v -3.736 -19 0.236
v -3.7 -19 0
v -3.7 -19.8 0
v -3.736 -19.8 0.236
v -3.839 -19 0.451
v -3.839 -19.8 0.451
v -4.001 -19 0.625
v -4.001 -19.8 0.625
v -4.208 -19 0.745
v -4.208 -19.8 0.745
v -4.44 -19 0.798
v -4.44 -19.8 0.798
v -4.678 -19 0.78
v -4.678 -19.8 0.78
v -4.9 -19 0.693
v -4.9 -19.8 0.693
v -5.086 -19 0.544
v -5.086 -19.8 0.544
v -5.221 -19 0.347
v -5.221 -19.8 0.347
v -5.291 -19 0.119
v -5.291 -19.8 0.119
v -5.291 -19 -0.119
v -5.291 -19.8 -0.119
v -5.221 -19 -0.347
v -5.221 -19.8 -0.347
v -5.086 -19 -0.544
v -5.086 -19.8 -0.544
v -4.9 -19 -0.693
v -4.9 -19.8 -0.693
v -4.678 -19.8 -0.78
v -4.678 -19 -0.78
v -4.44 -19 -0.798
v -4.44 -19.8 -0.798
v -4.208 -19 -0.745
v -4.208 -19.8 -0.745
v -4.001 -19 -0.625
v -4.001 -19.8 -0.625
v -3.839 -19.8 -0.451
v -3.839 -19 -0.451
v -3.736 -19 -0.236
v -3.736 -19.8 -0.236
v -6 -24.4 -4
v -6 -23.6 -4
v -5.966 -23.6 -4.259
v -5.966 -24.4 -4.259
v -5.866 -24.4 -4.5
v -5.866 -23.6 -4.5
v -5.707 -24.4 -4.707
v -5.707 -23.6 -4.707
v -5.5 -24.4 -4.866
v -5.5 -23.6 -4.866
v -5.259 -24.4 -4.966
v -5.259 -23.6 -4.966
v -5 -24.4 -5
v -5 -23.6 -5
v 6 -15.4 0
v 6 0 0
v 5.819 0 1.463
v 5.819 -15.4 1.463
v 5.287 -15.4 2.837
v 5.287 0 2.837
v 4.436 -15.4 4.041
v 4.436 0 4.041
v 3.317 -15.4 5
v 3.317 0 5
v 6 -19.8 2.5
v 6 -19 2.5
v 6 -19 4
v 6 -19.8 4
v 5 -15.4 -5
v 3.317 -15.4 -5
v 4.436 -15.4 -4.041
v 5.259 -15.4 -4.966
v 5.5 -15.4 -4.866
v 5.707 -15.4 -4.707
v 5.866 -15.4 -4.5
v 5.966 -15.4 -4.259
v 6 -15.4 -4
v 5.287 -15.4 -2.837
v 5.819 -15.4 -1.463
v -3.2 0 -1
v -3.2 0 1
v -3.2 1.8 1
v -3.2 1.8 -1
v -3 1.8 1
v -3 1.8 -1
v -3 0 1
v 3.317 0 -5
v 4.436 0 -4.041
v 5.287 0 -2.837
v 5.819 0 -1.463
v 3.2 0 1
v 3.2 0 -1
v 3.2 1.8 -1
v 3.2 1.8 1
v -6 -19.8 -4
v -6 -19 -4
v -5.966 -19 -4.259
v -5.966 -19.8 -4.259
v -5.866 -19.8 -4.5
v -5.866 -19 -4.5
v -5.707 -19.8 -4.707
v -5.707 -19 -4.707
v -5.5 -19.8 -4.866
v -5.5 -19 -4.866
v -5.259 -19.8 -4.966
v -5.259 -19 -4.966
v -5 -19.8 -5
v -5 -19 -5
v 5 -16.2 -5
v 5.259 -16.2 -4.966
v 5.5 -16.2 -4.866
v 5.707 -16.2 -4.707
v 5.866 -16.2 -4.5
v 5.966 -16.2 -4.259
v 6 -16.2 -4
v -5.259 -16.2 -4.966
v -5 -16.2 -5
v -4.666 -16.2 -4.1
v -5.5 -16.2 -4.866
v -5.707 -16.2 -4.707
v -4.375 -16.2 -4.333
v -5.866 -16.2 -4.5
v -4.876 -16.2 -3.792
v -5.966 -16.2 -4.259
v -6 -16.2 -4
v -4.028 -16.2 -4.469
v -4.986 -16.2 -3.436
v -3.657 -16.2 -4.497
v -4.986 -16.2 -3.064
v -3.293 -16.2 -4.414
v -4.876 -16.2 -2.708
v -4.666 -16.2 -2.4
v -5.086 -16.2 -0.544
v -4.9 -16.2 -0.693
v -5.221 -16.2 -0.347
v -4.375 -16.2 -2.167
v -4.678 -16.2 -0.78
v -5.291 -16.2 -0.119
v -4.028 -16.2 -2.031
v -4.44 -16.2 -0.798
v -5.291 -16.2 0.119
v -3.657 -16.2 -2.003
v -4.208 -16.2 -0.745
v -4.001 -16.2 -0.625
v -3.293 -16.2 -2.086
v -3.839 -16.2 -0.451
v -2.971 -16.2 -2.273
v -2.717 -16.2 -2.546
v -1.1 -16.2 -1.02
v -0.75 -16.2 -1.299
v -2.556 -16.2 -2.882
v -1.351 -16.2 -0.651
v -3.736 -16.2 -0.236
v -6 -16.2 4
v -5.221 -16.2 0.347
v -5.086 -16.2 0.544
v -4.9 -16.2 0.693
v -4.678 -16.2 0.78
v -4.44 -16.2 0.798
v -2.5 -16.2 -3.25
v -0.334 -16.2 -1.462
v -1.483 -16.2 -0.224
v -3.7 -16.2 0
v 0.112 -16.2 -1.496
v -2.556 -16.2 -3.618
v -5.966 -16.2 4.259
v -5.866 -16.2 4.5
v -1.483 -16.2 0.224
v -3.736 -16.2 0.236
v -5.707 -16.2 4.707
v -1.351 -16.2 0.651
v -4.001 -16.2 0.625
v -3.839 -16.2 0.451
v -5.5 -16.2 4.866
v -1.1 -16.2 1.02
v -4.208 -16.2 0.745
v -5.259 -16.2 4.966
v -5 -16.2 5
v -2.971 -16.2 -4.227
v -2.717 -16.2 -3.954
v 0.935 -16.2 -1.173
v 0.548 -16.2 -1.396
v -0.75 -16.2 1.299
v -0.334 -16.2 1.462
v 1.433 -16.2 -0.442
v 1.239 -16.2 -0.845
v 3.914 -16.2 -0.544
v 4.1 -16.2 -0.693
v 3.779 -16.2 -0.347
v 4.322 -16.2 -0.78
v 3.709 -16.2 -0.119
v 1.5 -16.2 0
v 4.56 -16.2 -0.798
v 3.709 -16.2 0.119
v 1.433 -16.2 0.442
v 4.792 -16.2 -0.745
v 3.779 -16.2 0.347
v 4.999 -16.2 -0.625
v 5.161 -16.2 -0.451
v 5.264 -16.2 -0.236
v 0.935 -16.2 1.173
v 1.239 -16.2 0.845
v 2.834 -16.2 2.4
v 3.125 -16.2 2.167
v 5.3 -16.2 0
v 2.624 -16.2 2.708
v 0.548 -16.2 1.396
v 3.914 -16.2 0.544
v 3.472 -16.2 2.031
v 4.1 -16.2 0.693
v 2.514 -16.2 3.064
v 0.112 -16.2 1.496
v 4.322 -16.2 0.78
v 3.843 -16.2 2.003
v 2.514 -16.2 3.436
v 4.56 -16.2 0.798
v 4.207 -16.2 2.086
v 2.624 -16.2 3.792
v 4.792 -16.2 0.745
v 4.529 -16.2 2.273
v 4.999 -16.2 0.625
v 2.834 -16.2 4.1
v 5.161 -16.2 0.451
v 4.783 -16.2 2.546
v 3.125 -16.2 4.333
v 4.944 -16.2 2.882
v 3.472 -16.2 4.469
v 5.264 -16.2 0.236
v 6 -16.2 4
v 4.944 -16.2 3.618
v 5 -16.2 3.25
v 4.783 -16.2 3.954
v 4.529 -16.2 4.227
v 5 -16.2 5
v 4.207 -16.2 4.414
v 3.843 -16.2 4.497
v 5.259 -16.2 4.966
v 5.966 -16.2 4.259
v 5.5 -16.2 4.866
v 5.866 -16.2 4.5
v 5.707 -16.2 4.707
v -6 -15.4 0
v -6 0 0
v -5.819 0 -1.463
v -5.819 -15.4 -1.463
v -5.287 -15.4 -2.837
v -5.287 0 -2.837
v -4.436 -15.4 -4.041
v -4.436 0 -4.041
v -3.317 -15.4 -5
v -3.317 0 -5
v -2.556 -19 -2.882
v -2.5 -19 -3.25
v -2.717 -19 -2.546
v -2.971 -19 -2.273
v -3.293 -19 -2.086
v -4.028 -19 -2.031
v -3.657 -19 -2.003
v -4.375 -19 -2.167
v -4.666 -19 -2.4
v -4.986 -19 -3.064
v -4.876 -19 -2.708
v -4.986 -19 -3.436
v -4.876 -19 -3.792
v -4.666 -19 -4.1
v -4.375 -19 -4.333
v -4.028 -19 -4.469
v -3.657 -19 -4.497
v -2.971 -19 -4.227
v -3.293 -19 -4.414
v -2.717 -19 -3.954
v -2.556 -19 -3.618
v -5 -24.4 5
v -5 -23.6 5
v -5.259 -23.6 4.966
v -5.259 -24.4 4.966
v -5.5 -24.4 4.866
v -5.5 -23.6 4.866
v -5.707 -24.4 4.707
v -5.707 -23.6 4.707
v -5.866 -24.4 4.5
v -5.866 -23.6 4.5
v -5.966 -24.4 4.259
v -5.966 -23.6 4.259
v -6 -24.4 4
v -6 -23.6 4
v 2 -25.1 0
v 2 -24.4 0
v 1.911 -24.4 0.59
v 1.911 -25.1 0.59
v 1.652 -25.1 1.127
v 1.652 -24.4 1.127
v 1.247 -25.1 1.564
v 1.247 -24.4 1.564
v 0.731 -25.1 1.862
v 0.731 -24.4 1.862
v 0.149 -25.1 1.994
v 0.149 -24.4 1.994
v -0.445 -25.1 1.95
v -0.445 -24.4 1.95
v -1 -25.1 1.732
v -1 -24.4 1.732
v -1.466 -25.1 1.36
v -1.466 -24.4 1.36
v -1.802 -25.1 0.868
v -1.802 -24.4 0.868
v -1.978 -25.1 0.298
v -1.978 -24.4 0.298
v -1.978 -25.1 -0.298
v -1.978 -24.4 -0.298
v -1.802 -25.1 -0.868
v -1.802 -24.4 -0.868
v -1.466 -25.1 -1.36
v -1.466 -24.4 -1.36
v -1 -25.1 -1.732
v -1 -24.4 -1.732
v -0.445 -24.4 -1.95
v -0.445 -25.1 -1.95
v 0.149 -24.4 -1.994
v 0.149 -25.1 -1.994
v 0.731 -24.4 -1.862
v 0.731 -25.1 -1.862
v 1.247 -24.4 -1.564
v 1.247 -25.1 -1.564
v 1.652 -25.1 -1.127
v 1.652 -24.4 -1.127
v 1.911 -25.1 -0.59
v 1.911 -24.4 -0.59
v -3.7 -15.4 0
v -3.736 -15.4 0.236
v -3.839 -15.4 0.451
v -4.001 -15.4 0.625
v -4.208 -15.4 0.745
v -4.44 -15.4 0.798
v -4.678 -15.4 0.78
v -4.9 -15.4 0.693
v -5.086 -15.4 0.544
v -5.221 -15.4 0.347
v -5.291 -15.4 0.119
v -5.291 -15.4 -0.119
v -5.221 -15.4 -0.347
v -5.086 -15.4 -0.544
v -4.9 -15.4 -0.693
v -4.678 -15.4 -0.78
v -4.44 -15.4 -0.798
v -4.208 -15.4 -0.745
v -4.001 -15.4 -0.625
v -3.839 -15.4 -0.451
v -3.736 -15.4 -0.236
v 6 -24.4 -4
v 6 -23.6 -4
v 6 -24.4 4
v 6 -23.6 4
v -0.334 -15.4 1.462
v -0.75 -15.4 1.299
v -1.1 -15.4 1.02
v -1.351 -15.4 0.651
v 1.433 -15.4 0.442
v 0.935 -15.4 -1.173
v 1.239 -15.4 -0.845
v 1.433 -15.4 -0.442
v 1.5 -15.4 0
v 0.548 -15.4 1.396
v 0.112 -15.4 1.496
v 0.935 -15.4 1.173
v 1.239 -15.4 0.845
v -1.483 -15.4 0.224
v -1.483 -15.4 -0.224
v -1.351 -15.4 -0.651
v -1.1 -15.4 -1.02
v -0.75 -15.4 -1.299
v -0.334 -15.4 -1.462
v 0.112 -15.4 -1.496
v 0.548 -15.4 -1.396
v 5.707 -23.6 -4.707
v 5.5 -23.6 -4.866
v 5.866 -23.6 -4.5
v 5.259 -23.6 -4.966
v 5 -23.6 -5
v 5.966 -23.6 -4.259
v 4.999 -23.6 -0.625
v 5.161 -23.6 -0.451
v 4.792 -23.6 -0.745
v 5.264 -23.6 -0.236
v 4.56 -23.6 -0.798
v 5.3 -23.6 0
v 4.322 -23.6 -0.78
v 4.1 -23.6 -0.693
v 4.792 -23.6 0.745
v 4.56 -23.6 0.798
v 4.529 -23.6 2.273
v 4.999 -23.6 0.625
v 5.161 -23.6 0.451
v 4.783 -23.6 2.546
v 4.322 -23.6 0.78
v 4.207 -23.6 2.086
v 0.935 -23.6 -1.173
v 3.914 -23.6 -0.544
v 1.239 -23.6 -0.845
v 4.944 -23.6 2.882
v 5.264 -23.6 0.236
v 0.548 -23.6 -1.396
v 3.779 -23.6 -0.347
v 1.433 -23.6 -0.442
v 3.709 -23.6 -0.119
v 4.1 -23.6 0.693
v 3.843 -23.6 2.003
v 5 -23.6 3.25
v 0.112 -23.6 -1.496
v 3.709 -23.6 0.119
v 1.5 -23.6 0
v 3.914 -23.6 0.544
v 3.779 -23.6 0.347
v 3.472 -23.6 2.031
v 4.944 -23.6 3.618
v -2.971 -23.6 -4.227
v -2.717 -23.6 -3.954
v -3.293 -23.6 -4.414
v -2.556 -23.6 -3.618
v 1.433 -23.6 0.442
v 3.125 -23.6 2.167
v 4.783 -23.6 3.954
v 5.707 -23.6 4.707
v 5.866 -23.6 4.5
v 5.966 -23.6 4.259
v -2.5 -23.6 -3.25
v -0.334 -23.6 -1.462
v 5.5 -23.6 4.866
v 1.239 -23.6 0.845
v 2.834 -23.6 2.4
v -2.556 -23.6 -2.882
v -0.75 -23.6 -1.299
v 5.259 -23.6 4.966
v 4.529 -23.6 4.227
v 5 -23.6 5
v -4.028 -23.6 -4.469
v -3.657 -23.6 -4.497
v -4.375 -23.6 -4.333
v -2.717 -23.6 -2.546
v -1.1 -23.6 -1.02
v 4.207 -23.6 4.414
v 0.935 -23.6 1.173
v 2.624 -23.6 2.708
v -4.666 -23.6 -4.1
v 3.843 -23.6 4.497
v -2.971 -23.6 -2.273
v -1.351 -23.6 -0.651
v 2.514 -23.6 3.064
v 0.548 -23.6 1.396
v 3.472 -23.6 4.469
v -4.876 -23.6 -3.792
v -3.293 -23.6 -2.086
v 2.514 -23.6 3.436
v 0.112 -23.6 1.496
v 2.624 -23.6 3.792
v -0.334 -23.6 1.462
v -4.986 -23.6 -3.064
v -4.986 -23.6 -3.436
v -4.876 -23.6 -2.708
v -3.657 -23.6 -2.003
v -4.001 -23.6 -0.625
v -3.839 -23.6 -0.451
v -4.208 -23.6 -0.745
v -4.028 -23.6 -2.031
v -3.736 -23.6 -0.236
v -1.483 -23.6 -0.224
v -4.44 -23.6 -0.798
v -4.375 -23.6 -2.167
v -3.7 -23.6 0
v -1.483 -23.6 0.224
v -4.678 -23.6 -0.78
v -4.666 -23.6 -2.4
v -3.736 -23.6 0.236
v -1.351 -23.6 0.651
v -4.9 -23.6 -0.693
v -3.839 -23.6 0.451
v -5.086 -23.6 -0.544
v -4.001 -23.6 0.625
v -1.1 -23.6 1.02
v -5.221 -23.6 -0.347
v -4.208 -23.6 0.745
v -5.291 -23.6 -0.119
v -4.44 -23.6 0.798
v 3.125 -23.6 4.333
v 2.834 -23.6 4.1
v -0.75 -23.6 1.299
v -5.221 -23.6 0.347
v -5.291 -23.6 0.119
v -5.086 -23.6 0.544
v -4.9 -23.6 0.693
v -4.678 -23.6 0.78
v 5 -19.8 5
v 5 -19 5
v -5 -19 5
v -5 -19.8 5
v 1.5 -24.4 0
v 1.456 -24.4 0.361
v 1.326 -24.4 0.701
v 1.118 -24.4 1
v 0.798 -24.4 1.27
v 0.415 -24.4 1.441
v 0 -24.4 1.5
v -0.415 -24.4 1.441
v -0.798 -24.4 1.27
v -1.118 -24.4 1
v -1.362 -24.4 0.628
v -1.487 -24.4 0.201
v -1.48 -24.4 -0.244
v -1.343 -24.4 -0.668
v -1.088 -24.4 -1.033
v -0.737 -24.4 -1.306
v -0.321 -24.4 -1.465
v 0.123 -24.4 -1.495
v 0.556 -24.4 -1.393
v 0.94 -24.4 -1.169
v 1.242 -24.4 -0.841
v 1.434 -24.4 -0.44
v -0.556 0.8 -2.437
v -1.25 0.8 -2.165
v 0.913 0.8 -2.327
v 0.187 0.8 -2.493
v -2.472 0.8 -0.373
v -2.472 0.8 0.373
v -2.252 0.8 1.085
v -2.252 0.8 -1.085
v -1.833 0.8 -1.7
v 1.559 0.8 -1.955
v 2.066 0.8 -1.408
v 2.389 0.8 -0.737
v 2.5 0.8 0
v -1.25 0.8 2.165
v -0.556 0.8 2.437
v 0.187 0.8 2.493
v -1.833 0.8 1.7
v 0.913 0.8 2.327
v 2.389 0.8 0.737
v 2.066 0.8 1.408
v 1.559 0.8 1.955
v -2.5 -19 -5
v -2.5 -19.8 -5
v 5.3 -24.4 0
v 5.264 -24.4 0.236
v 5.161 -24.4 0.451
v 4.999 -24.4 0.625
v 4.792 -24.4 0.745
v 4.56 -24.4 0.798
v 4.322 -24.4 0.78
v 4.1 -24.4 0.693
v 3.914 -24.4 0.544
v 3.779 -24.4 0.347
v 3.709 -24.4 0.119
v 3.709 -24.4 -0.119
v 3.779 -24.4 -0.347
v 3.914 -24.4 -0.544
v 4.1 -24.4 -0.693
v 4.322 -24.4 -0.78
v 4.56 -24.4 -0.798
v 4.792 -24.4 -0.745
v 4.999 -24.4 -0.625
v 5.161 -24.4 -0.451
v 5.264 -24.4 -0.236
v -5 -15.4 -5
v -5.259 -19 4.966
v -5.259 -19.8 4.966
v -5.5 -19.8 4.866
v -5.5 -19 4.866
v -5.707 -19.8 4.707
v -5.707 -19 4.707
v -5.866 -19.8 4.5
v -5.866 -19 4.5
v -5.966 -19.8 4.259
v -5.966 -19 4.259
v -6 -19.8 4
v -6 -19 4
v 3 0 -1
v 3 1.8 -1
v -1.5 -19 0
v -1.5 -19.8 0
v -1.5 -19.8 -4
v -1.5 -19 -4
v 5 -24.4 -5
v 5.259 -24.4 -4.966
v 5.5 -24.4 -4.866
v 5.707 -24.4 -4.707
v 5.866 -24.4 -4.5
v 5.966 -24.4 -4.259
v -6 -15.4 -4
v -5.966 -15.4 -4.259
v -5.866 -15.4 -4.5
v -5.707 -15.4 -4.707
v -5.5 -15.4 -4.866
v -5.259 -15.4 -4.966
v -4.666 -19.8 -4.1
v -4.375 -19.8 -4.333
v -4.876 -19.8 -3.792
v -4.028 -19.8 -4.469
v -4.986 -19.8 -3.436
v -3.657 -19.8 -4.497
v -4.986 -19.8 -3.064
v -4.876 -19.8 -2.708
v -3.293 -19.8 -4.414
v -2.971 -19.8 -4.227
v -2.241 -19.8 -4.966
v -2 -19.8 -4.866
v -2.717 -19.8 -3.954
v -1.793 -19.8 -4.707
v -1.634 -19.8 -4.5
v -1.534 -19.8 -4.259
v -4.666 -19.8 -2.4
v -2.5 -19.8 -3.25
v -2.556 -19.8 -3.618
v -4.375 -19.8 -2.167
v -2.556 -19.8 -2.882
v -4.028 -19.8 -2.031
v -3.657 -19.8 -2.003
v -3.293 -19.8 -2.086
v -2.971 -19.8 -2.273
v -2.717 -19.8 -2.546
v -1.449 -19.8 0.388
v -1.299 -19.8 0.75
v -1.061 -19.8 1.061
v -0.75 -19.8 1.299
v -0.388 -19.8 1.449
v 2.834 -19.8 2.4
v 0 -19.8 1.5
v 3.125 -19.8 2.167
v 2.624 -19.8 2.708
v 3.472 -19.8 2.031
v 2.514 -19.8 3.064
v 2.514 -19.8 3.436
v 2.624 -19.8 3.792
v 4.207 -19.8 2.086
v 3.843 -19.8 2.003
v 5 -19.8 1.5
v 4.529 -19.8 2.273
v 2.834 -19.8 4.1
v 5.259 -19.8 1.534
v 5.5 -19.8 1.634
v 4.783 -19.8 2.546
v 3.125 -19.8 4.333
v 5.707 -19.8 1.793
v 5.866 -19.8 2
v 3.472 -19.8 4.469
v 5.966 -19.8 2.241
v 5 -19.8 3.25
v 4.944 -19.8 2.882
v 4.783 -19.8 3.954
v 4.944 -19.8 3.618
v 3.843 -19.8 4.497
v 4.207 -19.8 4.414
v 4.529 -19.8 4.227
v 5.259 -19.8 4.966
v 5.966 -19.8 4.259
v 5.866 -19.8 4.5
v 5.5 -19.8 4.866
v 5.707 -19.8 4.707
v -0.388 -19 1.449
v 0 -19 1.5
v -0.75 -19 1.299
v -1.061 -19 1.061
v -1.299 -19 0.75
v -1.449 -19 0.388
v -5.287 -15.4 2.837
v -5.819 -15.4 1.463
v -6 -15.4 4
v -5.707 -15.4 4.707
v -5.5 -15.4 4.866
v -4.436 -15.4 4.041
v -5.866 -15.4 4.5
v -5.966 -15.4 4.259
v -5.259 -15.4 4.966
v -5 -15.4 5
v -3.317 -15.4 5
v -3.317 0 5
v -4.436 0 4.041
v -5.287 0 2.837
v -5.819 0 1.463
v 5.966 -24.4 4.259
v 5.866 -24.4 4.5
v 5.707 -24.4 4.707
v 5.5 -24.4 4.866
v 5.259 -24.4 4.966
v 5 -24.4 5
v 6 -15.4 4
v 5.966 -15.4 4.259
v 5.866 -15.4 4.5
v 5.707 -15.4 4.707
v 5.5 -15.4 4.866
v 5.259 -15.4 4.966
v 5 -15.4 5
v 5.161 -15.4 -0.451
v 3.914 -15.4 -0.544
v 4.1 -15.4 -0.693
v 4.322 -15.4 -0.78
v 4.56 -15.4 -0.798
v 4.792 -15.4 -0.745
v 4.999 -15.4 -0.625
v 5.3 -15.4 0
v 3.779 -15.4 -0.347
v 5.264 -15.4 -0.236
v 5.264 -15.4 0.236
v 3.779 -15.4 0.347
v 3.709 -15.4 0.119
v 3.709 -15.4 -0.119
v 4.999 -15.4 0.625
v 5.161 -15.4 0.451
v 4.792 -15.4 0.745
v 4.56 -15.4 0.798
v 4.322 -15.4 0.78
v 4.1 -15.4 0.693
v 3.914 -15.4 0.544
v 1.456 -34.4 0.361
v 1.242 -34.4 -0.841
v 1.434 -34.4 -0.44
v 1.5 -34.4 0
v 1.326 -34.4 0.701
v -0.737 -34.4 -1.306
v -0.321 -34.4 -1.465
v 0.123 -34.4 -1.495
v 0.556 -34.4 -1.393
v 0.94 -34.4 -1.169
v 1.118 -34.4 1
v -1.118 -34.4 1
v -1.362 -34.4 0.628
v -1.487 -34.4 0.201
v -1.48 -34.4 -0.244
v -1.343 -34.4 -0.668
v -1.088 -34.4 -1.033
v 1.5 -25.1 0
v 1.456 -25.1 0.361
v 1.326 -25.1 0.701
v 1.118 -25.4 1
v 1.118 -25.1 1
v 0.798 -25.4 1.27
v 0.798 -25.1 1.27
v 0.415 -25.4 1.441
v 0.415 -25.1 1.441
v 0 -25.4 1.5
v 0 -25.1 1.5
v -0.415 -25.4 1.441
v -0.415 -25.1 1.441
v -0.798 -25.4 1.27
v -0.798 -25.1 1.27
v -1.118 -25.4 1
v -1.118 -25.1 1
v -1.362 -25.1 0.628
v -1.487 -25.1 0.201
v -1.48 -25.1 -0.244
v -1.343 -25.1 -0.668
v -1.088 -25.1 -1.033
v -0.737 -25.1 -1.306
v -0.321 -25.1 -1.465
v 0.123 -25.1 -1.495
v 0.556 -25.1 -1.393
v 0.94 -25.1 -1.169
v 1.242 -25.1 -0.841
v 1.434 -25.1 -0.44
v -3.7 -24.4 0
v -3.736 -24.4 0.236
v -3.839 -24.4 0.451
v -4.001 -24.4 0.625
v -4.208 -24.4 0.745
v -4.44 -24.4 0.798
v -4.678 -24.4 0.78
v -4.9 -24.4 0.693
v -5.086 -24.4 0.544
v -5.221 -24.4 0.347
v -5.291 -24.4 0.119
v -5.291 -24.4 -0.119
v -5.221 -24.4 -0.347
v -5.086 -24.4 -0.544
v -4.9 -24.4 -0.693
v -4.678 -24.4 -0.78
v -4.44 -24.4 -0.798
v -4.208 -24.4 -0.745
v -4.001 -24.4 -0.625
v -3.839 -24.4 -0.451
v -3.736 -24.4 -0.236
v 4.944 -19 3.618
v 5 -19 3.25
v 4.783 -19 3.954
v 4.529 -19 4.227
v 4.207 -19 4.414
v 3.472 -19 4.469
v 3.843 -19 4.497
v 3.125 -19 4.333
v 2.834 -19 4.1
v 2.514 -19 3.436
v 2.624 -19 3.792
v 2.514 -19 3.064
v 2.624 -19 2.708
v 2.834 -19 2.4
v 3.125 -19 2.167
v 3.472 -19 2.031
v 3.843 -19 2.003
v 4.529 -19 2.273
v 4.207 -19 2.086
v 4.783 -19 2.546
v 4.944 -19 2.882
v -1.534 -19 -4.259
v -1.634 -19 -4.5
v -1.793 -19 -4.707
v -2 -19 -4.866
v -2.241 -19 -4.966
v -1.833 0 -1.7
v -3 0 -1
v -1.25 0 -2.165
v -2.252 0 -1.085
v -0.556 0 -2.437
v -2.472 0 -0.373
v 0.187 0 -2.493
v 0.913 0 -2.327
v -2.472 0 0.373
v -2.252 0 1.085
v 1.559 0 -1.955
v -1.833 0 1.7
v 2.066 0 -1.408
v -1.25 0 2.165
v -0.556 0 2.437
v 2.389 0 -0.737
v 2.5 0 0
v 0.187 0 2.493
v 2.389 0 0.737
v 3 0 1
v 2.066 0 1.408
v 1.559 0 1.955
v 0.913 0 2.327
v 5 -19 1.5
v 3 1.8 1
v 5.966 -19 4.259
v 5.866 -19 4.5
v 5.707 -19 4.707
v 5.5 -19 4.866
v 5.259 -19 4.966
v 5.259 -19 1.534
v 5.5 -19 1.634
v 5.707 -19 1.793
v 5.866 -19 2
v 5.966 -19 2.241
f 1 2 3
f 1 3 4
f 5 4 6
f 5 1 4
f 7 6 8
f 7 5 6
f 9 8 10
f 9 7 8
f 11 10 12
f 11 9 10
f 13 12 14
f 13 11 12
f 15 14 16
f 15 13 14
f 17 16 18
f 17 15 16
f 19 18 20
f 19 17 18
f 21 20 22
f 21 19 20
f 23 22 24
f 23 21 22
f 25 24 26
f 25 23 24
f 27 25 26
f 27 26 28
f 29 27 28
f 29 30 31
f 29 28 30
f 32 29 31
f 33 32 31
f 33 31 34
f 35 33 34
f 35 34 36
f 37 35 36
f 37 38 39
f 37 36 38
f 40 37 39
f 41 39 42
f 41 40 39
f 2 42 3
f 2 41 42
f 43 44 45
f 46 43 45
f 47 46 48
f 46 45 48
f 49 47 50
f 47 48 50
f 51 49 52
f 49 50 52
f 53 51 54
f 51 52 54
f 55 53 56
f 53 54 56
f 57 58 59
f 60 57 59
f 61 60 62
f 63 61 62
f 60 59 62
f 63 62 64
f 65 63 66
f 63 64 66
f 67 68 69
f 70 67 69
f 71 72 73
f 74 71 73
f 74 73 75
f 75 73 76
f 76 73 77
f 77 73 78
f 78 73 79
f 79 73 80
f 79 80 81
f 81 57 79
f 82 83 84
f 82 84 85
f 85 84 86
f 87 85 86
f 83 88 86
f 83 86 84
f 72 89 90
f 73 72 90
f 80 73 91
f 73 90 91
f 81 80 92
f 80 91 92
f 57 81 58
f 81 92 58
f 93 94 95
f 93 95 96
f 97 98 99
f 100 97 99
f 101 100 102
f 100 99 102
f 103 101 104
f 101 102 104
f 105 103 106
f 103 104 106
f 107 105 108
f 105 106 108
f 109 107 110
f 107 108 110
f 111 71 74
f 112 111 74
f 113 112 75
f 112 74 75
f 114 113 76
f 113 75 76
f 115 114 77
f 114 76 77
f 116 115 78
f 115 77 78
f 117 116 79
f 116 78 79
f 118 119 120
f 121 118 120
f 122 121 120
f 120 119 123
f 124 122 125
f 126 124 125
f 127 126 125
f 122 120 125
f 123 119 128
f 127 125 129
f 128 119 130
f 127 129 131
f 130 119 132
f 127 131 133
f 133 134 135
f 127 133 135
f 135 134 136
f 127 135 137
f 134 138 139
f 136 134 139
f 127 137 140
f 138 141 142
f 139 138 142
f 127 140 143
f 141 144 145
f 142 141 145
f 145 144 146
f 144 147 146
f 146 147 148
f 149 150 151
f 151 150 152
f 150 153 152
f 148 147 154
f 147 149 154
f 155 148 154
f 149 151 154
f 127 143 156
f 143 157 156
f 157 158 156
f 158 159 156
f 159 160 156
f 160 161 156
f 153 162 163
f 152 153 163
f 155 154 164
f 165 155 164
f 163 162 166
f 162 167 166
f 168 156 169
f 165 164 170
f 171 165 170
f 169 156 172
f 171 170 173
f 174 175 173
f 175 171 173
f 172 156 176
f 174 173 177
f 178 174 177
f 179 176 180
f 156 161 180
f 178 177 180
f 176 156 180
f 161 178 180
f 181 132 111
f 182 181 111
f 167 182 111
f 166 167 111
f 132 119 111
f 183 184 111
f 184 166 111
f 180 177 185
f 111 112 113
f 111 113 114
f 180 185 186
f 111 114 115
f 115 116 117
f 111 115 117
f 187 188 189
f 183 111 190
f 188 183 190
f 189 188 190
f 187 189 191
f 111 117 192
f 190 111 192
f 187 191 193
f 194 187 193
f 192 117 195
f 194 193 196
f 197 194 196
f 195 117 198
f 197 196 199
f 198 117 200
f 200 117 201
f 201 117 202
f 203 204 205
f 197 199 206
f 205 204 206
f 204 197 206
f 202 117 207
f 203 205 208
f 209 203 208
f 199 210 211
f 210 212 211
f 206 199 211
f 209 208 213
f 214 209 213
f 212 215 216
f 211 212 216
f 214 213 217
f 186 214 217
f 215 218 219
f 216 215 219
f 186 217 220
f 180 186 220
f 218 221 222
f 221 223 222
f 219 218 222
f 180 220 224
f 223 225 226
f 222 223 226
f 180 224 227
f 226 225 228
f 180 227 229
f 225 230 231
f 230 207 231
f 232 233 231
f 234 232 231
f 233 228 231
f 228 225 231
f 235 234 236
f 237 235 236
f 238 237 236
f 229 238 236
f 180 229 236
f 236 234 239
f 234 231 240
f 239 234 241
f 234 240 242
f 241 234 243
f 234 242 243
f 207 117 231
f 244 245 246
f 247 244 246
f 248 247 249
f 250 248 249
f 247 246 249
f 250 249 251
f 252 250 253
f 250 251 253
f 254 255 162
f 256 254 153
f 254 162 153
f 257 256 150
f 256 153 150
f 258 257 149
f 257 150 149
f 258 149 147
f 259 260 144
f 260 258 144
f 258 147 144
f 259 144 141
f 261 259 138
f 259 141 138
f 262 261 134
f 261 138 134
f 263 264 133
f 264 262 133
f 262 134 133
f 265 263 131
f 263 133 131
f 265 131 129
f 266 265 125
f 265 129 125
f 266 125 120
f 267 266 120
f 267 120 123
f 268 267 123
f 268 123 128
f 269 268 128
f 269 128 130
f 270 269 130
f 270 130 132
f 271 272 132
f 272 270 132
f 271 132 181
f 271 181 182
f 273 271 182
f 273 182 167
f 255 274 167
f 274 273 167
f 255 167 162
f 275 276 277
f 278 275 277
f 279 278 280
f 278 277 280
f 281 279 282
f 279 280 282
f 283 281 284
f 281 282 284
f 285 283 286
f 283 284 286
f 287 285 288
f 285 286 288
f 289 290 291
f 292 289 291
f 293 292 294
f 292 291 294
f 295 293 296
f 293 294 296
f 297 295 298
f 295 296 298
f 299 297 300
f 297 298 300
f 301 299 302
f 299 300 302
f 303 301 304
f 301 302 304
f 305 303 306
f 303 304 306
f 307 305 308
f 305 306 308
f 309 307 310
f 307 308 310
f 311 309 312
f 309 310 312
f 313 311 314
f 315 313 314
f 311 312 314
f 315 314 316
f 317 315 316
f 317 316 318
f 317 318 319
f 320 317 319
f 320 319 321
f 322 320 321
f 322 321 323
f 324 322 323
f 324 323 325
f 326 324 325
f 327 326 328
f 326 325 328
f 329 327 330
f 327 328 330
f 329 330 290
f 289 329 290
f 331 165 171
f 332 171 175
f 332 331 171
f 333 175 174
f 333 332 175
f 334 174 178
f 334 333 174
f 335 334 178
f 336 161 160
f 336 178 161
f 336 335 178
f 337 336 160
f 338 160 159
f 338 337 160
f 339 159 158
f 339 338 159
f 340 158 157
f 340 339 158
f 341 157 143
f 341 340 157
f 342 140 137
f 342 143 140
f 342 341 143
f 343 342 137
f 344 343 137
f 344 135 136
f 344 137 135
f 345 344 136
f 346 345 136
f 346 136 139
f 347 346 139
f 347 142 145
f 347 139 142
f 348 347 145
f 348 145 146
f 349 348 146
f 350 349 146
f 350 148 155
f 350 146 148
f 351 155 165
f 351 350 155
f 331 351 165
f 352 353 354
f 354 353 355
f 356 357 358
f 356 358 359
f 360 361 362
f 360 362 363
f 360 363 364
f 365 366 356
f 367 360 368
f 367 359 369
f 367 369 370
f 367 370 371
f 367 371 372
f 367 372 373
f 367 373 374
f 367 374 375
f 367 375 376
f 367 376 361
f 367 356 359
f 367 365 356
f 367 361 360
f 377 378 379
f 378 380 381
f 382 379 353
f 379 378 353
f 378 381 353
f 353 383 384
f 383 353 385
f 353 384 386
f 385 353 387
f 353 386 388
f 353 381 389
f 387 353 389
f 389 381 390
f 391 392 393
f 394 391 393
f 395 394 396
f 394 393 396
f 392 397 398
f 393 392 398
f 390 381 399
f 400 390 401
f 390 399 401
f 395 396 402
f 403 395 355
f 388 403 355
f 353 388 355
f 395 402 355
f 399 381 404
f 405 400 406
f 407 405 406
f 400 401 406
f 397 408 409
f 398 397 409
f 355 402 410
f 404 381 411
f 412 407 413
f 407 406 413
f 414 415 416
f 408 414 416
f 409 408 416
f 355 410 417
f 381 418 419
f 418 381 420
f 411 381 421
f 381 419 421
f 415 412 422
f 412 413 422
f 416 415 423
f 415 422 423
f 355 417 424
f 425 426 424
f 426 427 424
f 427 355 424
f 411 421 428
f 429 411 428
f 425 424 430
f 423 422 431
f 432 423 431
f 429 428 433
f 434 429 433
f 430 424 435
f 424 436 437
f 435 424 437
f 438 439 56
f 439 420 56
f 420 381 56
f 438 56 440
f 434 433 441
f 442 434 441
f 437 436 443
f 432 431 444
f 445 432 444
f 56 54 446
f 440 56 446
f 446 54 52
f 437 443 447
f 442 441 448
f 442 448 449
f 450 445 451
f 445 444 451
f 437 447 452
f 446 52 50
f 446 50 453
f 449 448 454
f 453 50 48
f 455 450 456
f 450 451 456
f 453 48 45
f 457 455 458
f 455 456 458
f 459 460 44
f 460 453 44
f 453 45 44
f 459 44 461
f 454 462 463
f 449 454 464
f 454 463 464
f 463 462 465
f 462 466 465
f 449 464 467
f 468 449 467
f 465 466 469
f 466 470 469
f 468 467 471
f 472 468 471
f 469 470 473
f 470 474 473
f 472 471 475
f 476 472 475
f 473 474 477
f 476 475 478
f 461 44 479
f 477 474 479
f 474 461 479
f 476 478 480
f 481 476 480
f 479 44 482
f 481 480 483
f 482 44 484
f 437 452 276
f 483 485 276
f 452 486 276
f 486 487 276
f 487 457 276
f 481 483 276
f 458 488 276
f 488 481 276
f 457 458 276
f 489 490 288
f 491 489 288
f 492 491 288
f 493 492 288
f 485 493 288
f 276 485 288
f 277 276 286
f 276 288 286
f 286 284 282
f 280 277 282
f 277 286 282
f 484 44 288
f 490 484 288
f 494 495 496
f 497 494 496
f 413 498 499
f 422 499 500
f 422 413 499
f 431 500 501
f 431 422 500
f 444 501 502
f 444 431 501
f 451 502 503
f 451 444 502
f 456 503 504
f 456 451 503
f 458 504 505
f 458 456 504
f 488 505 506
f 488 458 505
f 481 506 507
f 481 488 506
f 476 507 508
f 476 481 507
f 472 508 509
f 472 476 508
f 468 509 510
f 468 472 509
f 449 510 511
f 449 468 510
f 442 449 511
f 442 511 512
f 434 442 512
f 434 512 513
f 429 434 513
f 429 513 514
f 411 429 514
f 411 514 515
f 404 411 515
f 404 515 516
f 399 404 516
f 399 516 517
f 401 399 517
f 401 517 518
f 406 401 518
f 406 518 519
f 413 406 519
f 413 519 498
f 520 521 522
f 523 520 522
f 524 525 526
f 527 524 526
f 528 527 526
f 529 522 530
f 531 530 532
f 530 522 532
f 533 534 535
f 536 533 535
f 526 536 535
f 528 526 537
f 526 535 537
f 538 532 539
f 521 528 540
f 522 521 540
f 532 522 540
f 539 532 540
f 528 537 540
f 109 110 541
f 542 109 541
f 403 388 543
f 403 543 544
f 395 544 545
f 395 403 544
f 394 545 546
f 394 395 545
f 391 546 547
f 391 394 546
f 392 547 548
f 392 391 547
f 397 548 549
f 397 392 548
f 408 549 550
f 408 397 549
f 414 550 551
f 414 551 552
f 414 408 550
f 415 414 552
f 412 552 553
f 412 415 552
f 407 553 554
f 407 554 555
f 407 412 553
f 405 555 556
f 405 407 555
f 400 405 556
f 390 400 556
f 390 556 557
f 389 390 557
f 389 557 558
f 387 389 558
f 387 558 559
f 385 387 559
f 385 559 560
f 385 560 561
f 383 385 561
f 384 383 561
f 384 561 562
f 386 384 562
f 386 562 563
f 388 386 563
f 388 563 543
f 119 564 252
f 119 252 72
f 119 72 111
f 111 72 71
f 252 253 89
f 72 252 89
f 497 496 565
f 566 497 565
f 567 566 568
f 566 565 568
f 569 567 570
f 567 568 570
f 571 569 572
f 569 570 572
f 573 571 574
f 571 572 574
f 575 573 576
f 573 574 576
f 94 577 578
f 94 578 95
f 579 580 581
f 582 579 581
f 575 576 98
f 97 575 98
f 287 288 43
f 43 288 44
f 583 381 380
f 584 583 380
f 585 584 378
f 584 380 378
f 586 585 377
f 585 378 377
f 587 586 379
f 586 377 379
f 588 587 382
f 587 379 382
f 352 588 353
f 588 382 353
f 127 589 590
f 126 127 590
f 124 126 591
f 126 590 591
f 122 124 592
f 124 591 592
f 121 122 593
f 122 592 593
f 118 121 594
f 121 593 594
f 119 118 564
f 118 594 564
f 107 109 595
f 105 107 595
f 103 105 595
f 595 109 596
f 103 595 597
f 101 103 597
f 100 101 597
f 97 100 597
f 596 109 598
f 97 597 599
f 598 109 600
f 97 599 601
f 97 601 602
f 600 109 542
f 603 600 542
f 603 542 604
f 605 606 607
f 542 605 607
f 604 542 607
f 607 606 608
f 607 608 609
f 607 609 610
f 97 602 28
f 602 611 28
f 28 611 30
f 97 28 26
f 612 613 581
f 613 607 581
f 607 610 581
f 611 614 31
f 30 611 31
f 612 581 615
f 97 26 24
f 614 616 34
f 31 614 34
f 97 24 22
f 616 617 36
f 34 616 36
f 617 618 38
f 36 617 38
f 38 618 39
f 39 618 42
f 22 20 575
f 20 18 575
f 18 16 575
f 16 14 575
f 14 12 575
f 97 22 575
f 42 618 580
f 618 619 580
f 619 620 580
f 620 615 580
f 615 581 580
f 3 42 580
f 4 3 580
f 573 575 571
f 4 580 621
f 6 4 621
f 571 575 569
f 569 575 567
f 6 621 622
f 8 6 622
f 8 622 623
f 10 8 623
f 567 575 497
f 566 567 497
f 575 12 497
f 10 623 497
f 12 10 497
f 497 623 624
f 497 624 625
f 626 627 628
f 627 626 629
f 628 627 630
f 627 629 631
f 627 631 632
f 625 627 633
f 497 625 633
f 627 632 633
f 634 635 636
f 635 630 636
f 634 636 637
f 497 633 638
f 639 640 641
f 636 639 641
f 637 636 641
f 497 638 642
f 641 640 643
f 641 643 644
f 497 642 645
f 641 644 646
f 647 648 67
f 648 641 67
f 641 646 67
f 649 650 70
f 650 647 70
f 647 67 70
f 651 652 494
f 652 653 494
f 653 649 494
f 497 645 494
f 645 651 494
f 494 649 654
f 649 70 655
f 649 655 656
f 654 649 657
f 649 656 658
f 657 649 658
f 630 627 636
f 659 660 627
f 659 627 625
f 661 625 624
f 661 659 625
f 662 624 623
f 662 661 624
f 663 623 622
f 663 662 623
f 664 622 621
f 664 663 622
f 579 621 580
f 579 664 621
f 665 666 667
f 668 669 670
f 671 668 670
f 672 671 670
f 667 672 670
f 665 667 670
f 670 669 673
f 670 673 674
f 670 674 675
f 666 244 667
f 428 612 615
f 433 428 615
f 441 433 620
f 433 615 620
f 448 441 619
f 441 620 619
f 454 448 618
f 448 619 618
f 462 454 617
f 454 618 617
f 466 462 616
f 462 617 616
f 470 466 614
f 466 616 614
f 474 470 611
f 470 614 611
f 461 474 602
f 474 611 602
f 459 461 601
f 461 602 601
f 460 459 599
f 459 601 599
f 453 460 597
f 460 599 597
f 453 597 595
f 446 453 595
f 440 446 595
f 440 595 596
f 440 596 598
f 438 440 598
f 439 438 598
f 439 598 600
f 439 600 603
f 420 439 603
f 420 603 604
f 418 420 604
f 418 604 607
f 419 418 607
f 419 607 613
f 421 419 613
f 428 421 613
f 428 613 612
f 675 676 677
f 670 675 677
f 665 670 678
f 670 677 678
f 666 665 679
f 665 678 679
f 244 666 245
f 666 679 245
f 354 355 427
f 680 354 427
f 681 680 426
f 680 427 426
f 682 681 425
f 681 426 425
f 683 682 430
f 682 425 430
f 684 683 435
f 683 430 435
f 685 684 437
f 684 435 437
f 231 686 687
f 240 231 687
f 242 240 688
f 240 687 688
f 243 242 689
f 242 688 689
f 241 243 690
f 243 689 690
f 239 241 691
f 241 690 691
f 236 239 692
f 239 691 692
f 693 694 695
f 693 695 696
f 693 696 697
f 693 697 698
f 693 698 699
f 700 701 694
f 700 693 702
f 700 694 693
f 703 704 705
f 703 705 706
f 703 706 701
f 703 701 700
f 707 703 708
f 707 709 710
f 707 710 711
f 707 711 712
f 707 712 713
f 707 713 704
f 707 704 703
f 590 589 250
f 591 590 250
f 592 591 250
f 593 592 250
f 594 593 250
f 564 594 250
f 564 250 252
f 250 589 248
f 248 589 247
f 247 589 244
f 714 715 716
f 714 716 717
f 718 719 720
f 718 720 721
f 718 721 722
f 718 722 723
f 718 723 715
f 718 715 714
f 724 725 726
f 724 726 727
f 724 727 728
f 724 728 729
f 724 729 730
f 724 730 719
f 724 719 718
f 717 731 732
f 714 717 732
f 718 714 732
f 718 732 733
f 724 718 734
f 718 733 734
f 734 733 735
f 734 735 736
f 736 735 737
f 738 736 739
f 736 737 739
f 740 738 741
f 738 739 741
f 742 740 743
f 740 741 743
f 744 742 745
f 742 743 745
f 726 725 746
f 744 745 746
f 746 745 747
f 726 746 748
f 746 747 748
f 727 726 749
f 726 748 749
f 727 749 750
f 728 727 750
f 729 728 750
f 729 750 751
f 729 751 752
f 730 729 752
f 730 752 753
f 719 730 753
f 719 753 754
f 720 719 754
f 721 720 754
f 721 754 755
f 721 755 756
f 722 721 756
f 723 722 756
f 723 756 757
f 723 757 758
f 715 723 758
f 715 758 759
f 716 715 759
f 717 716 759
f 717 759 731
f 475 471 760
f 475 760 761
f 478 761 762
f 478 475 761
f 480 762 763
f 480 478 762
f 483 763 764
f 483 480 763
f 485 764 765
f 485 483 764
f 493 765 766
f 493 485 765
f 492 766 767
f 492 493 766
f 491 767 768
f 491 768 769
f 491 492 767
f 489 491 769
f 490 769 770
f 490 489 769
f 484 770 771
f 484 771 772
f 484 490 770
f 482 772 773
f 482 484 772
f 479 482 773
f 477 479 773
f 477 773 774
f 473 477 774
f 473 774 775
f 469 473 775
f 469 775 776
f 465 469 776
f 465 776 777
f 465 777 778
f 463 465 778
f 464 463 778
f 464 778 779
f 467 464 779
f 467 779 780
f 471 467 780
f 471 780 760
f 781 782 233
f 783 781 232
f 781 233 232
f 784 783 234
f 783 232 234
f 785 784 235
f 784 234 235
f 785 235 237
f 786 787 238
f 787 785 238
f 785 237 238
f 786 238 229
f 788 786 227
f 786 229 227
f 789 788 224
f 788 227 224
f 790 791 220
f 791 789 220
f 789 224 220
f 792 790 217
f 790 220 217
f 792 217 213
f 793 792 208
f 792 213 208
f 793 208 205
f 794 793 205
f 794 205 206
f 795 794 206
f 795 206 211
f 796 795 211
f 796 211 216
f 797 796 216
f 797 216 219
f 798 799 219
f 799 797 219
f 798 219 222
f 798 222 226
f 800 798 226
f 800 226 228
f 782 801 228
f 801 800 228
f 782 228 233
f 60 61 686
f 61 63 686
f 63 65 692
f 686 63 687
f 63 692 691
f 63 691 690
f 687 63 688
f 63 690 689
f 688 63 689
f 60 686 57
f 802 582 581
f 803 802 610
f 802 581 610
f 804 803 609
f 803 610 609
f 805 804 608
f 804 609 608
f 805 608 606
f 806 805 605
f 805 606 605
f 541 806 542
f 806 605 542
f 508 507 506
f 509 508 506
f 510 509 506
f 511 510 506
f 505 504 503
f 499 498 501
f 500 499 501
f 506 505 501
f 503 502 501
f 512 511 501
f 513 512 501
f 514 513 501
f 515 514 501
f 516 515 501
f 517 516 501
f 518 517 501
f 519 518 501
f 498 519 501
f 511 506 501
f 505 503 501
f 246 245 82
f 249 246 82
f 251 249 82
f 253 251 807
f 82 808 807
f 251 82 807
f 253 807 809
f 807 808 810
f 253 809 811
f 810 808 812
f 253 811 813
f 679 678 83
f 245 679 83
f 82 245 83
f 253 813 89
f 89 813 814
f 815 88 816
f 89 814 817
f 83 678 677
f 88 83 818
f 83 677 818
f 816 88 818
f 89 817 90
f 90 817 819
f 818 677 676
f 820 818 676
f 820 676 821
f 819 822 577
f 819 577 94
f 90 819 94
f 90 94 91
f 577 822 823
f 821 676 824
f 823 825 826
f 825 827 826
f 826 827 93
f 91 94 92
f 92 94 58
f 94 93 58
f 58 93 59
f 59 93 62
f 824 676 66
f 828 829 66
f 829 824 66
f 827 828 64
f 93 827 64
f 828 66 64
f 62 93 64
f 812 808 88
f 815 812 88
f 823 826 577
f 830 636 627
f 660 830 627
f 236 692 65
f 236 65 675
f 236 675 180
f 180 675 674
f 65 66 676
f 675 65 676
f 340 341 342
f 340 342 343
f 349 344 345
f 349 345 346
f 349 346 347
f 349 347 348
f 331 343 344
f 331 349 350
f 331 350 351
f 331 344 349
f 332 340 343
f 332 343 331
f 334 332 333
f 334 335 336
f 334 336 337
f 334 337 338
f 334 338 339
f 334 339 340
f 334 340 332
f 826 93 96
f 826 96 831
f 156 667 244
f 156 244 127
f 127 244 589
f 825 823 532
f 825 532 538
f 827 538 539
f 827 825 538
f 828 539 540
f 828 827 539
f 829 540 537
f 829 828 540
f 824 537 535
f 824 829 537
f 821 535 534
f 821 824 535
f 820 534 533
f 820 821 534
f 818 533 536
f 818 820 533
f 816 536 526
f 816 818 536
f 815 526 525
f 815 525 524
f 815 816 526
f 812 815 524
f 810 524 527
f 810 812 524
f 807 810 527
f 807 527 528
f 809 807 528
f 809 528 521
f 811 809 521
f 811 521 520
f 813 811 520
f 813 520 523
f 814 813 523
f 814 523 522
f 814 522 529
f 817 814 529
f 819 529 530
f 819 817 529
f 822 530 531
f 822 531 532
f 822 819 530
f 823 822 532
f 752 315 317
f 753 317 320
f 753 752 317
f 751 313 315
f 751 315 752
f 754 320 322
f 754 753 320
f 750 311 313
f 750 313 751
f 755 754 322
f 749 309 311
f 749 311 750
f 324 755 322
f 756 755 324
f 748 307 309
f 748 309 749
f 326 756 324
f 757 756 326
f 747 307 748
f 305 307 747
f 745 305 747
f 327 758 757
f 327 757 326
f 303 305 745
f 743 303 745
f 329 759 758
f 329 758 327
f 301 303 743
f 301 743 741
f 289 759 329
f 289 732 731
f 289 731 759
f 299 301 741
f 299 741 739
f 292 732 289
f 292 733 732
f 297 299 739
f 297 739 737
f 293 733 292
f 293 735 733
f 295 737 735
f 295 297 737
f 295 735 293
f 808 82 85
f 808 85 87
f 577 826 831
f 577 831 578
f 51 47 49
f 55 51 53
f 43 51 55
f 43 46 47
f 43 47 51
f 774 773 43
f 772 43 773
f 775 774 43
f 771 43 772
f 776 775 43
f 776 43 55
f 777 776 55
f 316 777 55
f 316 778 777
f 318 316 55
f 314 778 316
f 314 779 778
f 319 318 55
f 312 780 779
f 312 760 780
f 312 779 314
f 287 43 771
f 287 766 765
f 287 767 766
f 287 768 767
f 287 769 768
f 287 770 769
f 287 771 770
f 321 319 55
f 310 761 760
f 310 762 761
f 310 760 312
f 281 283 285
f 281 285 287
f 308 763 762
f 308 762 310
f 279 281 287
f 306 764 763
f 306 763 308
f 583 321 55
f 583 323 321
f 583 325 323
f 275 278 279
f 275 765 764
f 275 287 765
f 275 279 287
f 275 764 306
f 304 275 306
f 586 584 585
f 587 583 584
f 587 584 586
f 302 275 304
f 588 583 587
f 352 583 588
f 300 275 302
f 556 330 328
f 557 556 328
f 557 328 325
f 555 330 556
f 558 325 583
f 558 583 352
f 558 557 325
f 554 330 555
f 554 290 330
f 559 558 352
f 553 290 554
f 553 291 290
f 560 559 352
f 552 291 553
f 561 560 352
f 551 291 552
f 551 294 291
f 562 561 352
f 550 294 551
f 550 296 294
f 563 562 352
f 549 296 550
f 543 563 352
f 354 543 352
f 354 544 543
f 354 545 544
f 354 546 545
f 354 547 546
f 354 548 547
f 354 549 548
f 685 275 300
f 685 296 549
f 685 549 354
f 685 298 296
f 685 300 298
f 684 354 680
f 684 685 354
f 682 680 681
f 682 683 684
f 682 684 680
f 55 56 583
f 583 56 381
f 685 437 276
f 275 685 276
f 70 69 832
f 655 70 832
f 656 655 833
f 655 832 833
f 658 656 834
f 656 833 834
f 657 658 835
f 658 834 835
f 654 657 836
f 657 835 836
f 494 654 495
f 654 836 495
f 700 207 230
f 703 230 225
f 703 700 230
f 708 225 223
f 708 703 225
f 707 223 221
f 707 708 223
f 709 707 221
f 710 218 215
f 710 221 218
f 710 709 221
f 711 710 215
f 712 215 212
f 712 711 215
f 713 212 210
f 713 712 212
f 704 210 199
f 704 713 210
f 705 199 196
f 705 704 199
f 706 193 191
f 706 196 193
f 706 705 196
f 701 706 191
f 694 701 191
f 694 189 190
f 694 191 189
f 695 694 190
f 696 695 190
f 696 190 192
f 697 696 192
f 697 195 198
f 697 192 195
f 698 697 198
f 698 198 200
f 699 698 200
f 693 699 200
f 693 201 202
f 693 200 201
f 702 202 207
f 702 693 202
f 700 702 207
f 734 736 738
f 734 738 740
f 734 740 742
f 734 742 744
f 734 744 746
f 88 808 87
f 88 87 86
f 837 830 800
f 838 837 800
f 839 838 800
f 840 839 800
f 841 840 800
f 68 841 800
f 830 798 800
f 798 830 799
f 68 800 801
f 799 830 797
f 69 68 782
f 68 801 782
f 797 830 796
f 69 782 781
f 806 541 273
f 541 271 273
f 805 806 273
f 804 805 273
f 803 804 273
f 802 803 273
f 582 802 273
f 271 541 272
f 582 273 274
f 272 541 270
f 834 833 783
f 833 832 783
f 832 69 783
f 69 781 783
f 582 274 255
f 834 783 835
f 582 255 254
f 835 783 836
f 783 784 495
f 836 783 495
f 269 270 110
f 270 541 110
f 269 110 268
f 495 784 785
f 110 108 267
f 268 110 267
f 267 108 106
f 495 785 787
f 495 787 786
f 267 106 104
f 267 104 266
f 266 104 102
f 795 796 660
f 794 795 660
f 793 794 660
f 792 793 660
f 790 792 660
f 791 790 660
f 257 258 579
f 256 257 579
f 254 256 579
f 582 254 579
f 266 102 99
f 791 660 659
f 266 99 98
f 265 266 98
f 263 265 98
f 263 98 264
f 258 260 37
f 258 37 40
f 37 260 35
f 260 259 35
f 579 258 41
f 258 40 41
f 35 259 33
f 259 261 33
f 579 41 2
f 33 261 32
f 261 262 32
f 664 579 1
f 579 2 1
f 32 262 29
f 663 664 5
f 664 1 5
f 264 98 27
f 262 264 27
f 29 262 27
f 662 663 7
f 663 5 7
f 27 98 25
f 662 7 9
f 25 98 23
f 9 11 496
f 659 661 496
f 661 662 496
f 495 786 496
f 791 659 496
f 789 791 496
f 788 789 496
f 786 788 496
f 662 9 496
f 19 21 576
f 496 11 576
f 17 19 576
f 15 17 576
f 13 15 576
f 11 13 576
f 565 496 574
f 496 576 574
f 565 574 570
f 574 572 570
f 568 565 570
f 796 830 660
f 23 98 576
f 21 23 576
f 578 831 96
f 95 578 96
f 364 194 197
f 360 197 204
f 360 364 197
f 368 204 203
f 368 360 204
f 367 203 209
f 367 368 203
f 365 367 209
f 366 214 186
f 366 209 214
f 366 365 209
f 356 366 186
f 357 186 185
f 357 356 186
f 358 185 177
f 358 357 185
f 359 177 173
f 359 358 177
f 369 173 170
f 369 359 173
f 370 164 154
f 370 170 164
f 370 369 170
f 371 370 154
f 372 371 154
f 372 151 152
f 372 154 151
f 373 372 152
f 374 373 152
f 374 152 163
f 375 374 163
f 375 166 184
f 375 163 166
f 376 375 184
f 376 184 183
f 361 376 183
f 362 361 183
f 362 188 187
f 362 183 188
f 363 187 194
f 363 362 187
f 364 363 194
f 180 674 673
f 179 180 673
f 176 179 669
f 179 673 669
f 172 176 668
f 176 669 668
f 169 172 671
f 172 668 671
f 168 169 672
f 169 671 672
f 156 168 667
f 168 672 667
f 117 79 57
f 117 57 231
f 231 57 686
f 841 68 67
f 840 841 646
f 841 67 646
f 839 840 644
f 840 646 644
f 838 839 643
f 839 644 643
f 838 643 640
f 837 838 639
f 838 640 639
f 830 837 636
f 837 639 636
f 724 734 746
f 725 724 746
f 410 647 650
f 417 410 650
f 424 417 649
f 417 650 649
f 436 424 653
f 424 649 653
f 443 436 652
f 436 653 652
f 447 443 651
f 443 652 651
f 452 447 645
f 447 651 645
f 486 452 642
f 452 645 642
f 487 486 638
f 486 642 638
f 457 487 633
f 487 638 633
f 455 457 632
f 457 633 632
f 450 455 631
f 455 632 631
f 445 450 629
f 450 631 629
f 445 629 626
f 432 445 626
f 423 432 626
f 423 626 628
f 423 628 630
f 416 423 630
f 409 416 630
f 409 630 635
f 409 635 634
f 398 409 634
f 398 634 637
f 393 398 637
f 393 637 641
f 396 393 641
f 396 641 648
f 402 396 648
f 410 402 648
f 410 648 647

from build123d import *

# Parameters (mm, degrees)
F1_DEPTH      = 15.4
F3_DEPTH      = 0.8
F4_DEPTH      = 1.8
F5_R          = 0.8
F5_R_2        = 1.5
F6_DEPTH      = 9
F7_W          = 3.8
F7_H          = 10
F7_W_2        = 2.8
F8_DEPTH      = 25
F8_DEPTH_BACK = 25
F10_DEPTH     = 1
F12_R         = 1.25
F13_DEPTH     = 7.4
F15_R         = 2
F16_DEPTH     = 0.7
F17_DEPTH     = 1
F18_DEPTH     = 10


with BuildPart() as f1:
    # F0 (on Front) → F1 (new body)
    with BuildSketch(Plane.XZ):
        with BuildLine():
            ThreePointArc((3.3166247904, -5), (5.2867640737, -2.8372743309), (6, 0))
            ThreePointArc((6, 0), (5.2867640737, 2.8372743309), (3.3166247904, 5))
            Line((3.3166247904, 5), (-3.3166247904, 5))
            ThreePointArc((-3.3166247904, 5), (-5.2867640737, 2.8372743309), (-6, 0))
            ThreePointArc((-6, 0), (-5.2867640737, -2.8372743309), (-3.3166247904, -5))
            Line((-3.3166247904, -5), (3.3166247904, -5))
        make_face()
    extrude(amount=F1_DEPTH)

    # F2 (on Front) → F3 (join)
    with BuildSketch(Plane.XZ):
        with BuildLine():
            Line((2.5, 0), (-2.5, 0))
            ThreePointArc((-2.5, 0), (0, -2.5), (2.5, 0))
        make_face()
        with BuildLine():
            ThreePointArc((2.5, 0), (0, 2.5), (-2.5, 0))
            Line((-2.5, 0), (2.5, 0))
        make_face()
    extrude(amount=-F3_DEPTH)

    # F2 (on Front) → F4 (join)
    with BuildSketch(Plane.XZ):
        Polygon((3, 1), (3, 0), (3, -1), (3.2, -1), (3.2, 1), align=None)
        Polygon((-3, 1), (-3.2, 1), (-3.2, -1), (-3, -1), (-3, 0), align=None)
    extrude(amount=-F4_DEPTH)

    # F5 (on face) → F6 (join)
    with BuildSketch(Plane.XZ.offset(15.4)):
        with BuildLine():
            Line((5, 5), (-5, 5))
            ThreePointArc((-5, 5), (-5.7071067812, 4.7071067812), (-6, 4))
            Line((-6, 4), (-6, -4))
            ThreePointArc((-6, -4), (-5.7071067812, -4.7071067812), (-5, -5))
            Line((-5, -5), (5, -5))
            ThreePointArc((5, -5), (5.7071067812, -4.7071067812), (6, -4))
            Line((6, -4), (6, 4))
            ThreePointArc((6, 4), (5.7071067812, 4.7071067812), (5, 5))
        make_face()
        with Locations((-4.5, 0)):
            Circle(F5_R, mode=Mode.SUBTRACT)
        Circle(F5_R_2, mode=Mode.SUBTRACT)
        with Locations((4.5, 0)):
            Circle(F5_R, mode=Mode.SUBTRACT)
    extrude(amount=F6_DEPTH)

    # F7 (on Right) → F8 (cut, two sides)
    with BuildSketch(Plane.YZ) as f8_sk:
        with Locations((-21.7, 0)):
            Rectangle(F7_W, F7_H)
        with Locations((-17.6, 0)):
            Rectangle(F7_W_2, F7_H)
    extrude(amount=-F8_DEPTH, mode=Mode.SUBTRACT)
    extrude(f8_sk.sketch, amount=F8_DEPTH_BACK, mode=Mode.SUBTRACT)

    # F9 (on face) → F10 (cut)
    with BuildSketch(Plane.XZ.offset(19.8)):
        with BuildLine():
            Line((5, 1.5), (0, 1.5))
            ThreePointArc((0, 1.5), (-1.0606601718, 1.0606601718), (-1.5, 0))
            Line((-1.5, 0), (-1.5, -4))
            ThreePointArc((-1.5, -4), (-1.7928932188, -4.7071067812), (-2.5, -5))
            Line((-2.5, -5), (-2.5, -6))
            Line((-2.5, -6), (-1.5, -6))
            Line((-1.5, -6), (7, -6))
            Line((7, -6), (7, 2.5))
            Line((7, 2.5), (6, 2.5))
            ThreePointArc((6, 2.5), (5.7071067812, 1.7928932188), (5, 1.5))
        make_face()
    extrude(amount=-F10_DEPTH, mode=Mode.SUBTRACT)

    # F12 (on offset) → F13 (join)
    with BuildSketch(Plane.XZ.offset(16.2)):
        with Locations((-3.75, -3.25)):
            Circle(F12_R)
        with Locations((3.75, 3.25)):
            Circle(F12_R)
    extrude(amount=F13_DEPTH)

    # F15 (on offset) → F16 (join)
    with BuildSketch(Plane.XZ.offset(24.4)):
        Circle(F15_R)
        with BuildLine():
            ThreePointArc((1.1180339887, 1), (1.4012585384, 0.5352331347), (1.5, 0))
            ThreePointArc((1.5, 0), (-0.5352331347, -1.4012585384), (-1.1180339887, 1))
            ThreePointArc((-1.1180339887, 1), (0, 1.5), (1.1180339887, 1))
        make_face(mode=Mode.SUBTRACT)
    extrude(amount=F16_DEPTH)

    # F15 (on offset) → F17 (join)
    with BuildSketch(Plane.XZ.offset(24.4)):
        with BuildLine():
            Line((-1.1180339887, 1), (1.1180339887, 1))
            ThreePointArc((1.1180339887, 1), (0, 1.5), (-1.1180339887, 1))
        make_face()
        with BuildLine():
            ThreePointArc((-1.1180339887, 1), (-0.5352331347, -1.4012585384), (1.5, 0))
            ThreePointArc((1.5, 0), (1.4012585384, 0.5352331347), (1.1180339887, 1))
            Line((1.1180339887, 1), (-1.1180339887, 1))
        make_face()
    extrude(amount=F17_DEPTH)

    # F15 (on offset) → F18 (join)
    with BuildSketch(Plane.XZ.offset(24.4)):
        with BuildLine():
            ThreePointArc((-1.1180339887, 1), (-0.5352331347, -1.4012585384), (1.5, 0))
            ThreePointArc((1.5, 0), (1.4012585384, 0.5352331347), (1.1180339887, 1))
            Line((1.1180339887, 1), (-1.1180339887, 1))
        make_face()
    extrude(amount=F18_DEPTH)


solid = f1.part
